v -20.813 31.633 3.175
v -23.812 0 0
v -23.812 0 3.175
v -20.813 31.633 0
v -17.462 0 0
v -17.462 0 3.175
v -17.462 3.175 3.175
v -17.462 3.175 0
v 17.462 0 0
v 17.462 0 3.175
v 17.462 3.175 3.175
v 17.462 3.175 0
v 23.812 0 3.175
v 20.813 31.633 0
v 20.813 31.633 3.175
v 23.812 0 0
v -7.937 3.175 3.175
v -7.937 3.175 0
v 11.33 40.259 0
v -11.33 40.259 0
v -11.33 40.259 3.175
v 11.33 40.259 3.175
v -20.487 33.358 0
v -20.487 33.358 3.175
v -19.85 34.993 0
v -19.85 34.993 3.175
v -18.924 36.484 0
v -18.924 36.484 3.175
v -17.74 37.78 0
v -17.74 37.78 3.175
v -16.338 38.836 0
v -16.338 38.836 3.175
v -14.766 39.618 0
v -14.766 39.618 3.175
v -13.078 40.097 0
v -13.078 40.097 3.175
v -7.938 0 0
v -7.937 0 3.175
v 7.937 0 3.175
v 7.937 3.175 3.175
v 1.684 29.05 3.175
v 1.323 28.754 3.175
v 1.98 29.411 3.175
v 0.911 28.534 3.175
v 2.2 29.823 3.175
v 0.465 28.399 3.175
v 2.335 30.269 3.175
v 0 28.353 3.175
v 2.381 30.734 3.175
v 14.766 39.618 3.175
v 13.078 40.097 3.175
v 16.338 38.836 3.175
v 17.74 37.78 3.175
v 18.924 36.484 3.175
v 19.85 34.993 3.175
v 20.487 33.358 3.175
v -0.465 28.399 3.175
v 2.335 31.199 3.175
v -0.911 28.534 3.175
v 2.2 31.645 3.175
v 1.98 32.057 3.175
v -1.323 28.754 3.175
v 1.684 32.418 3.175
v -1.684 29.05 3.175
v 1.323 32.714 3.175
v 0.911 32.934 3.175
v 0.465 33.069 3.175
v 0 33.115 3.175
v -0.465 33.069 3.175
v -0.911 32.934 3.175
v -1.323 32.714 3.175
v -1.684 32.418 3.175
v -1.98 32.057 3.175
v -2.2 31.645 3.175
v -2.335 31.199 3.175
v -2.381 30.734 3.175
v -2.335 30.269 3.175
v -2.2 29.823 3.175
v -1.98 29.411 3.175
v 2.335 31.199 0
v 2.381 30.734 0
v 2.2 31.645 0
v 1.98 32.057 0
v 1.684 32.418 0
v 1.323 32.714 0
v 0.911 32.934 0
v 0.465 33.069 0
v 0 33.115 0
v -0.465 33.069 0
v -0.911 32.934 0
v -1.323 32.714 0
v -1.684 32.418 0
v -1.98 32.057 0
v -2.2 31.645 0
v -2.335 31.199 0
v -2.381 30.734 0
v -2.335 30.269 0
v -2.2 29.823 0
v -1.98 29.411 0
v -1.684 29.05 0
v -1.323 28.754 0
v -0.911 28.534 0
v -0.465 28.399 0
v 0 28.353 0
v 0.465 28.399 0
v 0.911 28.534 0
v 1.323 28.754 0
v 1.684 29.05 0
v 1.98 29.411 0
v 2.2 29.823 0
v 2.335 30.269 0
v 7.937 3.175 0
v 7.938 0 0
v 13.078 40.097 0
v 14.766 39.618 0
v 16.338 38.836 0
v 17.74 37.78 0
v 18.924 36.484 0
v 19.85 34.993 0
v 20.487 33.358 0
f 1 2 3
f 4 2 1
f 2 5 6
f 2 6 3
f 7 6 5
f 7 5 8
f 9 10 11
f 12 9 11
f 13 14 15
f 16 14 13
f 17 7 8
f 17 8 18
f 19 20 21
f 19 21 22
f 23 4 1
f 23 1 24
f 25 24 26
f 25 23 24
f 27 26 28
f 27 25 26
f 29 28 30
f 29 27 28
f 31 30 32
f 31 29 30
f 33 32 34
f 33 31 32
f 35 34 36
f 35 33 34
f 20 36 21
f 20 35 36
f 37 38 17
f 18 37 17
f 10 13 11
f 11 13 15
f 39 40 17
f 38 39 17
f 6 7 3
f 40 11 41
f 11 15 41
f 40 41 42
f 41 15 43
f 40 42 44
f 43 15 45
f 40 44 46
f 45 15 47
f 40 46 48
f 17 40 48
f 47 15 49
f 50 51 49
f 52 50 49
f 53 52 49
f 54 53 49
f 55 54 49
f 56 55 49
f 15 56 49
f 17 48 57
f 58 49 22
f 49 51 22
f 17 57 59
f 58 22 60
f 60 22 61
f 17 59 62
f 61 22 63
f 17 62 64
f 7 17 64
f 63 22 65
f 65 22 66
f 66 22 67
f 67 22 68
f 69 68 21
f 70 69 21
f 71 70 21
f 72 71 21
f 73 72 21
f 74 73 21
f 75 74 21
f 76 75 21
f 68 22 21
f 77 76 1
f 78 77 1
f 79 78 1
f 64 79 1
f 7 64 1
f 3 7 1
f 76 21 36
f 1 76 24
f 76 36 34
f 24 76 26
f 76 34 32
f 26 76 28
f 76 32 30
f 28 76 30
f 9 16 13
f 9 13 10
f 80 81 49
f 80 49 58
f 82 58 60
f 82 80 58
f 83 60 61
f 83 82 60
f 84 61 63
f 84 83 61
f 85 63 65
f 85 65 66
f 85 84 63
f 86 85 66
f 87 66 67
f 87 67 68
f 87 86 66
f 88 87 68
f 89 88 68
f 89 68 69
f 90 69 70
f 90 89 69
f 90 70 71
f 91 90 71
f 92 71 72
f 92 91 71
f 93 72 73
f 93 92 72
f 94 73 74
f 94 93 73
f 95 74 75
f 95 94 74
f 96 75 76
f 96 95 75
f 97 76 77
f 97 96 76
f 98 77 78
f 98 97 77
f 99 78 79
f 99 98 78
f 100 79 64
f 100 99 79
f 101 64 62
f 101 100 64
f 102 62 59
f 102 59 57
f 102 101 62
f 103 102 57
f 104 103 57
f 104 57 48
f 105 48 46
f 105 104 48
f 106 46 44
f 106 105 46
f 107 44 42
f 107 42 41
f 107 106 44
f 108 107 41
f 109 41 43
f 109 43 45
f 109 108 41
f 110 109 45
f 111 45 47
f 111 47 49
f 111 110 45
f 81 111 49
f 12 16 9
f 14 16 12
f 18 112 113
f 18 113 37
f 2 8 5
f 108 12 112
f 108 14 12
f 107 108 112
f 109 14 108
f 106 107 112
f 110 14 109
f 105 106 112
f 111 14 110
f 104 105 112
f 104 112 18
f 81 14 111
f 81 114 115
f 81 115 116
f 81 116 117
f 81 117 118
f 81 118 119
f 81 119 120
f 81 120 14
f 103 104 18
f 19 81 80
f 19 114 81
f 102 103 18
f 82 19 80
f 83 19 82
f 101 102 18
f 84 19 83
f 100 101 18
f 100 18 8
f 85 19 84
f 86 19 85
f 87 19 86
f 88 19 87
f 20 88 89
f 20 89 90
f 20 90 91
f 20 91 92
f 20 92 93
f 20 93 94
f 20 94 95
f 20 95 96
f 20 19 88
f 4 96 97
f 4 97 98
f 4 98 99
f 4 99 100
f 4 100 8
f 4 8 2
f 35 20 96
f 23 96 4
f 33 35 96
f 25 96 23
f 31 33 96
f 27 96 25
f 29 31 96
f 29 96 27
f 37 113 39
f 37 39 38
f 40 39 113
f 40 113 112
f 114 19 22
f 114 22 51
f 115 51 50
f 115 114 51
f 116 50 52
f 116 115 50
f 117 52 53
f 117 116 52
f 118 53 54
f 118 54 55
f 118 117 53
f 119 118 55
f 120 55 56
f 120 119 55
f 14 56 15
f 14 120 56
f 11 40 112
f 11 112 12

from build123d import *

# Parameters (mm, degrees)
SKETCH1_R           = 2.38125
BOSS_EXTRUDE1_DEPTH = 3.175
SKETCH2_W           = 9.525
SKETCH2_H           = 3.175
CUT_EXTRUDE1_DEPTH  = 47.881796705


with BuildPart() as part:
    # Sketch1 → Boss-Extrude1 (new body)
    with BuildSketch(Plane.XY):
        with BuildLine():
            Line((-11.330339119, 40.259), (11.330339119, 40.259))
            ThreePointArc((11.330339119, 40.259), (17.739736735, 37.779938348), (20.812800106, 31.633198887))
            Line((20.812800106, 31.633198887), (23.8125, 0))
            Line((23.8125, 0), (-23.8125, 0))
            Line((-23.8125, 0), (-20.812800106, 31.633198887))
            ThreePointArc((-20.812800106, 31.633198887), (-17.739736735, 37.779938348), (-11.330339119, 40.259))
        make_face()
        with Locations((0, 30.734)):
            Circle(SKETCH1_R, mode=Mode.SUBTRACT)
    extrude(amount=BOSS_EXTRUDE1_DEPTH)

    # Sketch2 → Cut-Extrude1 (cut, through all)
    with BuildSketch(Plane.XY.offset(3.175)):
        with Locations((-12.7, 1.5875)):
            Rectangle(SKETCH2_W, SKETCH2_H)
        with Locations((12.7, 1.5875)):
            Rectangle(SKETCH2_W, SKETCH2_H)
    extrude(amount=-CUT_EXTRUDE1_DEPTH, mode=Mode.SUBTRACT)


solid = part.part
